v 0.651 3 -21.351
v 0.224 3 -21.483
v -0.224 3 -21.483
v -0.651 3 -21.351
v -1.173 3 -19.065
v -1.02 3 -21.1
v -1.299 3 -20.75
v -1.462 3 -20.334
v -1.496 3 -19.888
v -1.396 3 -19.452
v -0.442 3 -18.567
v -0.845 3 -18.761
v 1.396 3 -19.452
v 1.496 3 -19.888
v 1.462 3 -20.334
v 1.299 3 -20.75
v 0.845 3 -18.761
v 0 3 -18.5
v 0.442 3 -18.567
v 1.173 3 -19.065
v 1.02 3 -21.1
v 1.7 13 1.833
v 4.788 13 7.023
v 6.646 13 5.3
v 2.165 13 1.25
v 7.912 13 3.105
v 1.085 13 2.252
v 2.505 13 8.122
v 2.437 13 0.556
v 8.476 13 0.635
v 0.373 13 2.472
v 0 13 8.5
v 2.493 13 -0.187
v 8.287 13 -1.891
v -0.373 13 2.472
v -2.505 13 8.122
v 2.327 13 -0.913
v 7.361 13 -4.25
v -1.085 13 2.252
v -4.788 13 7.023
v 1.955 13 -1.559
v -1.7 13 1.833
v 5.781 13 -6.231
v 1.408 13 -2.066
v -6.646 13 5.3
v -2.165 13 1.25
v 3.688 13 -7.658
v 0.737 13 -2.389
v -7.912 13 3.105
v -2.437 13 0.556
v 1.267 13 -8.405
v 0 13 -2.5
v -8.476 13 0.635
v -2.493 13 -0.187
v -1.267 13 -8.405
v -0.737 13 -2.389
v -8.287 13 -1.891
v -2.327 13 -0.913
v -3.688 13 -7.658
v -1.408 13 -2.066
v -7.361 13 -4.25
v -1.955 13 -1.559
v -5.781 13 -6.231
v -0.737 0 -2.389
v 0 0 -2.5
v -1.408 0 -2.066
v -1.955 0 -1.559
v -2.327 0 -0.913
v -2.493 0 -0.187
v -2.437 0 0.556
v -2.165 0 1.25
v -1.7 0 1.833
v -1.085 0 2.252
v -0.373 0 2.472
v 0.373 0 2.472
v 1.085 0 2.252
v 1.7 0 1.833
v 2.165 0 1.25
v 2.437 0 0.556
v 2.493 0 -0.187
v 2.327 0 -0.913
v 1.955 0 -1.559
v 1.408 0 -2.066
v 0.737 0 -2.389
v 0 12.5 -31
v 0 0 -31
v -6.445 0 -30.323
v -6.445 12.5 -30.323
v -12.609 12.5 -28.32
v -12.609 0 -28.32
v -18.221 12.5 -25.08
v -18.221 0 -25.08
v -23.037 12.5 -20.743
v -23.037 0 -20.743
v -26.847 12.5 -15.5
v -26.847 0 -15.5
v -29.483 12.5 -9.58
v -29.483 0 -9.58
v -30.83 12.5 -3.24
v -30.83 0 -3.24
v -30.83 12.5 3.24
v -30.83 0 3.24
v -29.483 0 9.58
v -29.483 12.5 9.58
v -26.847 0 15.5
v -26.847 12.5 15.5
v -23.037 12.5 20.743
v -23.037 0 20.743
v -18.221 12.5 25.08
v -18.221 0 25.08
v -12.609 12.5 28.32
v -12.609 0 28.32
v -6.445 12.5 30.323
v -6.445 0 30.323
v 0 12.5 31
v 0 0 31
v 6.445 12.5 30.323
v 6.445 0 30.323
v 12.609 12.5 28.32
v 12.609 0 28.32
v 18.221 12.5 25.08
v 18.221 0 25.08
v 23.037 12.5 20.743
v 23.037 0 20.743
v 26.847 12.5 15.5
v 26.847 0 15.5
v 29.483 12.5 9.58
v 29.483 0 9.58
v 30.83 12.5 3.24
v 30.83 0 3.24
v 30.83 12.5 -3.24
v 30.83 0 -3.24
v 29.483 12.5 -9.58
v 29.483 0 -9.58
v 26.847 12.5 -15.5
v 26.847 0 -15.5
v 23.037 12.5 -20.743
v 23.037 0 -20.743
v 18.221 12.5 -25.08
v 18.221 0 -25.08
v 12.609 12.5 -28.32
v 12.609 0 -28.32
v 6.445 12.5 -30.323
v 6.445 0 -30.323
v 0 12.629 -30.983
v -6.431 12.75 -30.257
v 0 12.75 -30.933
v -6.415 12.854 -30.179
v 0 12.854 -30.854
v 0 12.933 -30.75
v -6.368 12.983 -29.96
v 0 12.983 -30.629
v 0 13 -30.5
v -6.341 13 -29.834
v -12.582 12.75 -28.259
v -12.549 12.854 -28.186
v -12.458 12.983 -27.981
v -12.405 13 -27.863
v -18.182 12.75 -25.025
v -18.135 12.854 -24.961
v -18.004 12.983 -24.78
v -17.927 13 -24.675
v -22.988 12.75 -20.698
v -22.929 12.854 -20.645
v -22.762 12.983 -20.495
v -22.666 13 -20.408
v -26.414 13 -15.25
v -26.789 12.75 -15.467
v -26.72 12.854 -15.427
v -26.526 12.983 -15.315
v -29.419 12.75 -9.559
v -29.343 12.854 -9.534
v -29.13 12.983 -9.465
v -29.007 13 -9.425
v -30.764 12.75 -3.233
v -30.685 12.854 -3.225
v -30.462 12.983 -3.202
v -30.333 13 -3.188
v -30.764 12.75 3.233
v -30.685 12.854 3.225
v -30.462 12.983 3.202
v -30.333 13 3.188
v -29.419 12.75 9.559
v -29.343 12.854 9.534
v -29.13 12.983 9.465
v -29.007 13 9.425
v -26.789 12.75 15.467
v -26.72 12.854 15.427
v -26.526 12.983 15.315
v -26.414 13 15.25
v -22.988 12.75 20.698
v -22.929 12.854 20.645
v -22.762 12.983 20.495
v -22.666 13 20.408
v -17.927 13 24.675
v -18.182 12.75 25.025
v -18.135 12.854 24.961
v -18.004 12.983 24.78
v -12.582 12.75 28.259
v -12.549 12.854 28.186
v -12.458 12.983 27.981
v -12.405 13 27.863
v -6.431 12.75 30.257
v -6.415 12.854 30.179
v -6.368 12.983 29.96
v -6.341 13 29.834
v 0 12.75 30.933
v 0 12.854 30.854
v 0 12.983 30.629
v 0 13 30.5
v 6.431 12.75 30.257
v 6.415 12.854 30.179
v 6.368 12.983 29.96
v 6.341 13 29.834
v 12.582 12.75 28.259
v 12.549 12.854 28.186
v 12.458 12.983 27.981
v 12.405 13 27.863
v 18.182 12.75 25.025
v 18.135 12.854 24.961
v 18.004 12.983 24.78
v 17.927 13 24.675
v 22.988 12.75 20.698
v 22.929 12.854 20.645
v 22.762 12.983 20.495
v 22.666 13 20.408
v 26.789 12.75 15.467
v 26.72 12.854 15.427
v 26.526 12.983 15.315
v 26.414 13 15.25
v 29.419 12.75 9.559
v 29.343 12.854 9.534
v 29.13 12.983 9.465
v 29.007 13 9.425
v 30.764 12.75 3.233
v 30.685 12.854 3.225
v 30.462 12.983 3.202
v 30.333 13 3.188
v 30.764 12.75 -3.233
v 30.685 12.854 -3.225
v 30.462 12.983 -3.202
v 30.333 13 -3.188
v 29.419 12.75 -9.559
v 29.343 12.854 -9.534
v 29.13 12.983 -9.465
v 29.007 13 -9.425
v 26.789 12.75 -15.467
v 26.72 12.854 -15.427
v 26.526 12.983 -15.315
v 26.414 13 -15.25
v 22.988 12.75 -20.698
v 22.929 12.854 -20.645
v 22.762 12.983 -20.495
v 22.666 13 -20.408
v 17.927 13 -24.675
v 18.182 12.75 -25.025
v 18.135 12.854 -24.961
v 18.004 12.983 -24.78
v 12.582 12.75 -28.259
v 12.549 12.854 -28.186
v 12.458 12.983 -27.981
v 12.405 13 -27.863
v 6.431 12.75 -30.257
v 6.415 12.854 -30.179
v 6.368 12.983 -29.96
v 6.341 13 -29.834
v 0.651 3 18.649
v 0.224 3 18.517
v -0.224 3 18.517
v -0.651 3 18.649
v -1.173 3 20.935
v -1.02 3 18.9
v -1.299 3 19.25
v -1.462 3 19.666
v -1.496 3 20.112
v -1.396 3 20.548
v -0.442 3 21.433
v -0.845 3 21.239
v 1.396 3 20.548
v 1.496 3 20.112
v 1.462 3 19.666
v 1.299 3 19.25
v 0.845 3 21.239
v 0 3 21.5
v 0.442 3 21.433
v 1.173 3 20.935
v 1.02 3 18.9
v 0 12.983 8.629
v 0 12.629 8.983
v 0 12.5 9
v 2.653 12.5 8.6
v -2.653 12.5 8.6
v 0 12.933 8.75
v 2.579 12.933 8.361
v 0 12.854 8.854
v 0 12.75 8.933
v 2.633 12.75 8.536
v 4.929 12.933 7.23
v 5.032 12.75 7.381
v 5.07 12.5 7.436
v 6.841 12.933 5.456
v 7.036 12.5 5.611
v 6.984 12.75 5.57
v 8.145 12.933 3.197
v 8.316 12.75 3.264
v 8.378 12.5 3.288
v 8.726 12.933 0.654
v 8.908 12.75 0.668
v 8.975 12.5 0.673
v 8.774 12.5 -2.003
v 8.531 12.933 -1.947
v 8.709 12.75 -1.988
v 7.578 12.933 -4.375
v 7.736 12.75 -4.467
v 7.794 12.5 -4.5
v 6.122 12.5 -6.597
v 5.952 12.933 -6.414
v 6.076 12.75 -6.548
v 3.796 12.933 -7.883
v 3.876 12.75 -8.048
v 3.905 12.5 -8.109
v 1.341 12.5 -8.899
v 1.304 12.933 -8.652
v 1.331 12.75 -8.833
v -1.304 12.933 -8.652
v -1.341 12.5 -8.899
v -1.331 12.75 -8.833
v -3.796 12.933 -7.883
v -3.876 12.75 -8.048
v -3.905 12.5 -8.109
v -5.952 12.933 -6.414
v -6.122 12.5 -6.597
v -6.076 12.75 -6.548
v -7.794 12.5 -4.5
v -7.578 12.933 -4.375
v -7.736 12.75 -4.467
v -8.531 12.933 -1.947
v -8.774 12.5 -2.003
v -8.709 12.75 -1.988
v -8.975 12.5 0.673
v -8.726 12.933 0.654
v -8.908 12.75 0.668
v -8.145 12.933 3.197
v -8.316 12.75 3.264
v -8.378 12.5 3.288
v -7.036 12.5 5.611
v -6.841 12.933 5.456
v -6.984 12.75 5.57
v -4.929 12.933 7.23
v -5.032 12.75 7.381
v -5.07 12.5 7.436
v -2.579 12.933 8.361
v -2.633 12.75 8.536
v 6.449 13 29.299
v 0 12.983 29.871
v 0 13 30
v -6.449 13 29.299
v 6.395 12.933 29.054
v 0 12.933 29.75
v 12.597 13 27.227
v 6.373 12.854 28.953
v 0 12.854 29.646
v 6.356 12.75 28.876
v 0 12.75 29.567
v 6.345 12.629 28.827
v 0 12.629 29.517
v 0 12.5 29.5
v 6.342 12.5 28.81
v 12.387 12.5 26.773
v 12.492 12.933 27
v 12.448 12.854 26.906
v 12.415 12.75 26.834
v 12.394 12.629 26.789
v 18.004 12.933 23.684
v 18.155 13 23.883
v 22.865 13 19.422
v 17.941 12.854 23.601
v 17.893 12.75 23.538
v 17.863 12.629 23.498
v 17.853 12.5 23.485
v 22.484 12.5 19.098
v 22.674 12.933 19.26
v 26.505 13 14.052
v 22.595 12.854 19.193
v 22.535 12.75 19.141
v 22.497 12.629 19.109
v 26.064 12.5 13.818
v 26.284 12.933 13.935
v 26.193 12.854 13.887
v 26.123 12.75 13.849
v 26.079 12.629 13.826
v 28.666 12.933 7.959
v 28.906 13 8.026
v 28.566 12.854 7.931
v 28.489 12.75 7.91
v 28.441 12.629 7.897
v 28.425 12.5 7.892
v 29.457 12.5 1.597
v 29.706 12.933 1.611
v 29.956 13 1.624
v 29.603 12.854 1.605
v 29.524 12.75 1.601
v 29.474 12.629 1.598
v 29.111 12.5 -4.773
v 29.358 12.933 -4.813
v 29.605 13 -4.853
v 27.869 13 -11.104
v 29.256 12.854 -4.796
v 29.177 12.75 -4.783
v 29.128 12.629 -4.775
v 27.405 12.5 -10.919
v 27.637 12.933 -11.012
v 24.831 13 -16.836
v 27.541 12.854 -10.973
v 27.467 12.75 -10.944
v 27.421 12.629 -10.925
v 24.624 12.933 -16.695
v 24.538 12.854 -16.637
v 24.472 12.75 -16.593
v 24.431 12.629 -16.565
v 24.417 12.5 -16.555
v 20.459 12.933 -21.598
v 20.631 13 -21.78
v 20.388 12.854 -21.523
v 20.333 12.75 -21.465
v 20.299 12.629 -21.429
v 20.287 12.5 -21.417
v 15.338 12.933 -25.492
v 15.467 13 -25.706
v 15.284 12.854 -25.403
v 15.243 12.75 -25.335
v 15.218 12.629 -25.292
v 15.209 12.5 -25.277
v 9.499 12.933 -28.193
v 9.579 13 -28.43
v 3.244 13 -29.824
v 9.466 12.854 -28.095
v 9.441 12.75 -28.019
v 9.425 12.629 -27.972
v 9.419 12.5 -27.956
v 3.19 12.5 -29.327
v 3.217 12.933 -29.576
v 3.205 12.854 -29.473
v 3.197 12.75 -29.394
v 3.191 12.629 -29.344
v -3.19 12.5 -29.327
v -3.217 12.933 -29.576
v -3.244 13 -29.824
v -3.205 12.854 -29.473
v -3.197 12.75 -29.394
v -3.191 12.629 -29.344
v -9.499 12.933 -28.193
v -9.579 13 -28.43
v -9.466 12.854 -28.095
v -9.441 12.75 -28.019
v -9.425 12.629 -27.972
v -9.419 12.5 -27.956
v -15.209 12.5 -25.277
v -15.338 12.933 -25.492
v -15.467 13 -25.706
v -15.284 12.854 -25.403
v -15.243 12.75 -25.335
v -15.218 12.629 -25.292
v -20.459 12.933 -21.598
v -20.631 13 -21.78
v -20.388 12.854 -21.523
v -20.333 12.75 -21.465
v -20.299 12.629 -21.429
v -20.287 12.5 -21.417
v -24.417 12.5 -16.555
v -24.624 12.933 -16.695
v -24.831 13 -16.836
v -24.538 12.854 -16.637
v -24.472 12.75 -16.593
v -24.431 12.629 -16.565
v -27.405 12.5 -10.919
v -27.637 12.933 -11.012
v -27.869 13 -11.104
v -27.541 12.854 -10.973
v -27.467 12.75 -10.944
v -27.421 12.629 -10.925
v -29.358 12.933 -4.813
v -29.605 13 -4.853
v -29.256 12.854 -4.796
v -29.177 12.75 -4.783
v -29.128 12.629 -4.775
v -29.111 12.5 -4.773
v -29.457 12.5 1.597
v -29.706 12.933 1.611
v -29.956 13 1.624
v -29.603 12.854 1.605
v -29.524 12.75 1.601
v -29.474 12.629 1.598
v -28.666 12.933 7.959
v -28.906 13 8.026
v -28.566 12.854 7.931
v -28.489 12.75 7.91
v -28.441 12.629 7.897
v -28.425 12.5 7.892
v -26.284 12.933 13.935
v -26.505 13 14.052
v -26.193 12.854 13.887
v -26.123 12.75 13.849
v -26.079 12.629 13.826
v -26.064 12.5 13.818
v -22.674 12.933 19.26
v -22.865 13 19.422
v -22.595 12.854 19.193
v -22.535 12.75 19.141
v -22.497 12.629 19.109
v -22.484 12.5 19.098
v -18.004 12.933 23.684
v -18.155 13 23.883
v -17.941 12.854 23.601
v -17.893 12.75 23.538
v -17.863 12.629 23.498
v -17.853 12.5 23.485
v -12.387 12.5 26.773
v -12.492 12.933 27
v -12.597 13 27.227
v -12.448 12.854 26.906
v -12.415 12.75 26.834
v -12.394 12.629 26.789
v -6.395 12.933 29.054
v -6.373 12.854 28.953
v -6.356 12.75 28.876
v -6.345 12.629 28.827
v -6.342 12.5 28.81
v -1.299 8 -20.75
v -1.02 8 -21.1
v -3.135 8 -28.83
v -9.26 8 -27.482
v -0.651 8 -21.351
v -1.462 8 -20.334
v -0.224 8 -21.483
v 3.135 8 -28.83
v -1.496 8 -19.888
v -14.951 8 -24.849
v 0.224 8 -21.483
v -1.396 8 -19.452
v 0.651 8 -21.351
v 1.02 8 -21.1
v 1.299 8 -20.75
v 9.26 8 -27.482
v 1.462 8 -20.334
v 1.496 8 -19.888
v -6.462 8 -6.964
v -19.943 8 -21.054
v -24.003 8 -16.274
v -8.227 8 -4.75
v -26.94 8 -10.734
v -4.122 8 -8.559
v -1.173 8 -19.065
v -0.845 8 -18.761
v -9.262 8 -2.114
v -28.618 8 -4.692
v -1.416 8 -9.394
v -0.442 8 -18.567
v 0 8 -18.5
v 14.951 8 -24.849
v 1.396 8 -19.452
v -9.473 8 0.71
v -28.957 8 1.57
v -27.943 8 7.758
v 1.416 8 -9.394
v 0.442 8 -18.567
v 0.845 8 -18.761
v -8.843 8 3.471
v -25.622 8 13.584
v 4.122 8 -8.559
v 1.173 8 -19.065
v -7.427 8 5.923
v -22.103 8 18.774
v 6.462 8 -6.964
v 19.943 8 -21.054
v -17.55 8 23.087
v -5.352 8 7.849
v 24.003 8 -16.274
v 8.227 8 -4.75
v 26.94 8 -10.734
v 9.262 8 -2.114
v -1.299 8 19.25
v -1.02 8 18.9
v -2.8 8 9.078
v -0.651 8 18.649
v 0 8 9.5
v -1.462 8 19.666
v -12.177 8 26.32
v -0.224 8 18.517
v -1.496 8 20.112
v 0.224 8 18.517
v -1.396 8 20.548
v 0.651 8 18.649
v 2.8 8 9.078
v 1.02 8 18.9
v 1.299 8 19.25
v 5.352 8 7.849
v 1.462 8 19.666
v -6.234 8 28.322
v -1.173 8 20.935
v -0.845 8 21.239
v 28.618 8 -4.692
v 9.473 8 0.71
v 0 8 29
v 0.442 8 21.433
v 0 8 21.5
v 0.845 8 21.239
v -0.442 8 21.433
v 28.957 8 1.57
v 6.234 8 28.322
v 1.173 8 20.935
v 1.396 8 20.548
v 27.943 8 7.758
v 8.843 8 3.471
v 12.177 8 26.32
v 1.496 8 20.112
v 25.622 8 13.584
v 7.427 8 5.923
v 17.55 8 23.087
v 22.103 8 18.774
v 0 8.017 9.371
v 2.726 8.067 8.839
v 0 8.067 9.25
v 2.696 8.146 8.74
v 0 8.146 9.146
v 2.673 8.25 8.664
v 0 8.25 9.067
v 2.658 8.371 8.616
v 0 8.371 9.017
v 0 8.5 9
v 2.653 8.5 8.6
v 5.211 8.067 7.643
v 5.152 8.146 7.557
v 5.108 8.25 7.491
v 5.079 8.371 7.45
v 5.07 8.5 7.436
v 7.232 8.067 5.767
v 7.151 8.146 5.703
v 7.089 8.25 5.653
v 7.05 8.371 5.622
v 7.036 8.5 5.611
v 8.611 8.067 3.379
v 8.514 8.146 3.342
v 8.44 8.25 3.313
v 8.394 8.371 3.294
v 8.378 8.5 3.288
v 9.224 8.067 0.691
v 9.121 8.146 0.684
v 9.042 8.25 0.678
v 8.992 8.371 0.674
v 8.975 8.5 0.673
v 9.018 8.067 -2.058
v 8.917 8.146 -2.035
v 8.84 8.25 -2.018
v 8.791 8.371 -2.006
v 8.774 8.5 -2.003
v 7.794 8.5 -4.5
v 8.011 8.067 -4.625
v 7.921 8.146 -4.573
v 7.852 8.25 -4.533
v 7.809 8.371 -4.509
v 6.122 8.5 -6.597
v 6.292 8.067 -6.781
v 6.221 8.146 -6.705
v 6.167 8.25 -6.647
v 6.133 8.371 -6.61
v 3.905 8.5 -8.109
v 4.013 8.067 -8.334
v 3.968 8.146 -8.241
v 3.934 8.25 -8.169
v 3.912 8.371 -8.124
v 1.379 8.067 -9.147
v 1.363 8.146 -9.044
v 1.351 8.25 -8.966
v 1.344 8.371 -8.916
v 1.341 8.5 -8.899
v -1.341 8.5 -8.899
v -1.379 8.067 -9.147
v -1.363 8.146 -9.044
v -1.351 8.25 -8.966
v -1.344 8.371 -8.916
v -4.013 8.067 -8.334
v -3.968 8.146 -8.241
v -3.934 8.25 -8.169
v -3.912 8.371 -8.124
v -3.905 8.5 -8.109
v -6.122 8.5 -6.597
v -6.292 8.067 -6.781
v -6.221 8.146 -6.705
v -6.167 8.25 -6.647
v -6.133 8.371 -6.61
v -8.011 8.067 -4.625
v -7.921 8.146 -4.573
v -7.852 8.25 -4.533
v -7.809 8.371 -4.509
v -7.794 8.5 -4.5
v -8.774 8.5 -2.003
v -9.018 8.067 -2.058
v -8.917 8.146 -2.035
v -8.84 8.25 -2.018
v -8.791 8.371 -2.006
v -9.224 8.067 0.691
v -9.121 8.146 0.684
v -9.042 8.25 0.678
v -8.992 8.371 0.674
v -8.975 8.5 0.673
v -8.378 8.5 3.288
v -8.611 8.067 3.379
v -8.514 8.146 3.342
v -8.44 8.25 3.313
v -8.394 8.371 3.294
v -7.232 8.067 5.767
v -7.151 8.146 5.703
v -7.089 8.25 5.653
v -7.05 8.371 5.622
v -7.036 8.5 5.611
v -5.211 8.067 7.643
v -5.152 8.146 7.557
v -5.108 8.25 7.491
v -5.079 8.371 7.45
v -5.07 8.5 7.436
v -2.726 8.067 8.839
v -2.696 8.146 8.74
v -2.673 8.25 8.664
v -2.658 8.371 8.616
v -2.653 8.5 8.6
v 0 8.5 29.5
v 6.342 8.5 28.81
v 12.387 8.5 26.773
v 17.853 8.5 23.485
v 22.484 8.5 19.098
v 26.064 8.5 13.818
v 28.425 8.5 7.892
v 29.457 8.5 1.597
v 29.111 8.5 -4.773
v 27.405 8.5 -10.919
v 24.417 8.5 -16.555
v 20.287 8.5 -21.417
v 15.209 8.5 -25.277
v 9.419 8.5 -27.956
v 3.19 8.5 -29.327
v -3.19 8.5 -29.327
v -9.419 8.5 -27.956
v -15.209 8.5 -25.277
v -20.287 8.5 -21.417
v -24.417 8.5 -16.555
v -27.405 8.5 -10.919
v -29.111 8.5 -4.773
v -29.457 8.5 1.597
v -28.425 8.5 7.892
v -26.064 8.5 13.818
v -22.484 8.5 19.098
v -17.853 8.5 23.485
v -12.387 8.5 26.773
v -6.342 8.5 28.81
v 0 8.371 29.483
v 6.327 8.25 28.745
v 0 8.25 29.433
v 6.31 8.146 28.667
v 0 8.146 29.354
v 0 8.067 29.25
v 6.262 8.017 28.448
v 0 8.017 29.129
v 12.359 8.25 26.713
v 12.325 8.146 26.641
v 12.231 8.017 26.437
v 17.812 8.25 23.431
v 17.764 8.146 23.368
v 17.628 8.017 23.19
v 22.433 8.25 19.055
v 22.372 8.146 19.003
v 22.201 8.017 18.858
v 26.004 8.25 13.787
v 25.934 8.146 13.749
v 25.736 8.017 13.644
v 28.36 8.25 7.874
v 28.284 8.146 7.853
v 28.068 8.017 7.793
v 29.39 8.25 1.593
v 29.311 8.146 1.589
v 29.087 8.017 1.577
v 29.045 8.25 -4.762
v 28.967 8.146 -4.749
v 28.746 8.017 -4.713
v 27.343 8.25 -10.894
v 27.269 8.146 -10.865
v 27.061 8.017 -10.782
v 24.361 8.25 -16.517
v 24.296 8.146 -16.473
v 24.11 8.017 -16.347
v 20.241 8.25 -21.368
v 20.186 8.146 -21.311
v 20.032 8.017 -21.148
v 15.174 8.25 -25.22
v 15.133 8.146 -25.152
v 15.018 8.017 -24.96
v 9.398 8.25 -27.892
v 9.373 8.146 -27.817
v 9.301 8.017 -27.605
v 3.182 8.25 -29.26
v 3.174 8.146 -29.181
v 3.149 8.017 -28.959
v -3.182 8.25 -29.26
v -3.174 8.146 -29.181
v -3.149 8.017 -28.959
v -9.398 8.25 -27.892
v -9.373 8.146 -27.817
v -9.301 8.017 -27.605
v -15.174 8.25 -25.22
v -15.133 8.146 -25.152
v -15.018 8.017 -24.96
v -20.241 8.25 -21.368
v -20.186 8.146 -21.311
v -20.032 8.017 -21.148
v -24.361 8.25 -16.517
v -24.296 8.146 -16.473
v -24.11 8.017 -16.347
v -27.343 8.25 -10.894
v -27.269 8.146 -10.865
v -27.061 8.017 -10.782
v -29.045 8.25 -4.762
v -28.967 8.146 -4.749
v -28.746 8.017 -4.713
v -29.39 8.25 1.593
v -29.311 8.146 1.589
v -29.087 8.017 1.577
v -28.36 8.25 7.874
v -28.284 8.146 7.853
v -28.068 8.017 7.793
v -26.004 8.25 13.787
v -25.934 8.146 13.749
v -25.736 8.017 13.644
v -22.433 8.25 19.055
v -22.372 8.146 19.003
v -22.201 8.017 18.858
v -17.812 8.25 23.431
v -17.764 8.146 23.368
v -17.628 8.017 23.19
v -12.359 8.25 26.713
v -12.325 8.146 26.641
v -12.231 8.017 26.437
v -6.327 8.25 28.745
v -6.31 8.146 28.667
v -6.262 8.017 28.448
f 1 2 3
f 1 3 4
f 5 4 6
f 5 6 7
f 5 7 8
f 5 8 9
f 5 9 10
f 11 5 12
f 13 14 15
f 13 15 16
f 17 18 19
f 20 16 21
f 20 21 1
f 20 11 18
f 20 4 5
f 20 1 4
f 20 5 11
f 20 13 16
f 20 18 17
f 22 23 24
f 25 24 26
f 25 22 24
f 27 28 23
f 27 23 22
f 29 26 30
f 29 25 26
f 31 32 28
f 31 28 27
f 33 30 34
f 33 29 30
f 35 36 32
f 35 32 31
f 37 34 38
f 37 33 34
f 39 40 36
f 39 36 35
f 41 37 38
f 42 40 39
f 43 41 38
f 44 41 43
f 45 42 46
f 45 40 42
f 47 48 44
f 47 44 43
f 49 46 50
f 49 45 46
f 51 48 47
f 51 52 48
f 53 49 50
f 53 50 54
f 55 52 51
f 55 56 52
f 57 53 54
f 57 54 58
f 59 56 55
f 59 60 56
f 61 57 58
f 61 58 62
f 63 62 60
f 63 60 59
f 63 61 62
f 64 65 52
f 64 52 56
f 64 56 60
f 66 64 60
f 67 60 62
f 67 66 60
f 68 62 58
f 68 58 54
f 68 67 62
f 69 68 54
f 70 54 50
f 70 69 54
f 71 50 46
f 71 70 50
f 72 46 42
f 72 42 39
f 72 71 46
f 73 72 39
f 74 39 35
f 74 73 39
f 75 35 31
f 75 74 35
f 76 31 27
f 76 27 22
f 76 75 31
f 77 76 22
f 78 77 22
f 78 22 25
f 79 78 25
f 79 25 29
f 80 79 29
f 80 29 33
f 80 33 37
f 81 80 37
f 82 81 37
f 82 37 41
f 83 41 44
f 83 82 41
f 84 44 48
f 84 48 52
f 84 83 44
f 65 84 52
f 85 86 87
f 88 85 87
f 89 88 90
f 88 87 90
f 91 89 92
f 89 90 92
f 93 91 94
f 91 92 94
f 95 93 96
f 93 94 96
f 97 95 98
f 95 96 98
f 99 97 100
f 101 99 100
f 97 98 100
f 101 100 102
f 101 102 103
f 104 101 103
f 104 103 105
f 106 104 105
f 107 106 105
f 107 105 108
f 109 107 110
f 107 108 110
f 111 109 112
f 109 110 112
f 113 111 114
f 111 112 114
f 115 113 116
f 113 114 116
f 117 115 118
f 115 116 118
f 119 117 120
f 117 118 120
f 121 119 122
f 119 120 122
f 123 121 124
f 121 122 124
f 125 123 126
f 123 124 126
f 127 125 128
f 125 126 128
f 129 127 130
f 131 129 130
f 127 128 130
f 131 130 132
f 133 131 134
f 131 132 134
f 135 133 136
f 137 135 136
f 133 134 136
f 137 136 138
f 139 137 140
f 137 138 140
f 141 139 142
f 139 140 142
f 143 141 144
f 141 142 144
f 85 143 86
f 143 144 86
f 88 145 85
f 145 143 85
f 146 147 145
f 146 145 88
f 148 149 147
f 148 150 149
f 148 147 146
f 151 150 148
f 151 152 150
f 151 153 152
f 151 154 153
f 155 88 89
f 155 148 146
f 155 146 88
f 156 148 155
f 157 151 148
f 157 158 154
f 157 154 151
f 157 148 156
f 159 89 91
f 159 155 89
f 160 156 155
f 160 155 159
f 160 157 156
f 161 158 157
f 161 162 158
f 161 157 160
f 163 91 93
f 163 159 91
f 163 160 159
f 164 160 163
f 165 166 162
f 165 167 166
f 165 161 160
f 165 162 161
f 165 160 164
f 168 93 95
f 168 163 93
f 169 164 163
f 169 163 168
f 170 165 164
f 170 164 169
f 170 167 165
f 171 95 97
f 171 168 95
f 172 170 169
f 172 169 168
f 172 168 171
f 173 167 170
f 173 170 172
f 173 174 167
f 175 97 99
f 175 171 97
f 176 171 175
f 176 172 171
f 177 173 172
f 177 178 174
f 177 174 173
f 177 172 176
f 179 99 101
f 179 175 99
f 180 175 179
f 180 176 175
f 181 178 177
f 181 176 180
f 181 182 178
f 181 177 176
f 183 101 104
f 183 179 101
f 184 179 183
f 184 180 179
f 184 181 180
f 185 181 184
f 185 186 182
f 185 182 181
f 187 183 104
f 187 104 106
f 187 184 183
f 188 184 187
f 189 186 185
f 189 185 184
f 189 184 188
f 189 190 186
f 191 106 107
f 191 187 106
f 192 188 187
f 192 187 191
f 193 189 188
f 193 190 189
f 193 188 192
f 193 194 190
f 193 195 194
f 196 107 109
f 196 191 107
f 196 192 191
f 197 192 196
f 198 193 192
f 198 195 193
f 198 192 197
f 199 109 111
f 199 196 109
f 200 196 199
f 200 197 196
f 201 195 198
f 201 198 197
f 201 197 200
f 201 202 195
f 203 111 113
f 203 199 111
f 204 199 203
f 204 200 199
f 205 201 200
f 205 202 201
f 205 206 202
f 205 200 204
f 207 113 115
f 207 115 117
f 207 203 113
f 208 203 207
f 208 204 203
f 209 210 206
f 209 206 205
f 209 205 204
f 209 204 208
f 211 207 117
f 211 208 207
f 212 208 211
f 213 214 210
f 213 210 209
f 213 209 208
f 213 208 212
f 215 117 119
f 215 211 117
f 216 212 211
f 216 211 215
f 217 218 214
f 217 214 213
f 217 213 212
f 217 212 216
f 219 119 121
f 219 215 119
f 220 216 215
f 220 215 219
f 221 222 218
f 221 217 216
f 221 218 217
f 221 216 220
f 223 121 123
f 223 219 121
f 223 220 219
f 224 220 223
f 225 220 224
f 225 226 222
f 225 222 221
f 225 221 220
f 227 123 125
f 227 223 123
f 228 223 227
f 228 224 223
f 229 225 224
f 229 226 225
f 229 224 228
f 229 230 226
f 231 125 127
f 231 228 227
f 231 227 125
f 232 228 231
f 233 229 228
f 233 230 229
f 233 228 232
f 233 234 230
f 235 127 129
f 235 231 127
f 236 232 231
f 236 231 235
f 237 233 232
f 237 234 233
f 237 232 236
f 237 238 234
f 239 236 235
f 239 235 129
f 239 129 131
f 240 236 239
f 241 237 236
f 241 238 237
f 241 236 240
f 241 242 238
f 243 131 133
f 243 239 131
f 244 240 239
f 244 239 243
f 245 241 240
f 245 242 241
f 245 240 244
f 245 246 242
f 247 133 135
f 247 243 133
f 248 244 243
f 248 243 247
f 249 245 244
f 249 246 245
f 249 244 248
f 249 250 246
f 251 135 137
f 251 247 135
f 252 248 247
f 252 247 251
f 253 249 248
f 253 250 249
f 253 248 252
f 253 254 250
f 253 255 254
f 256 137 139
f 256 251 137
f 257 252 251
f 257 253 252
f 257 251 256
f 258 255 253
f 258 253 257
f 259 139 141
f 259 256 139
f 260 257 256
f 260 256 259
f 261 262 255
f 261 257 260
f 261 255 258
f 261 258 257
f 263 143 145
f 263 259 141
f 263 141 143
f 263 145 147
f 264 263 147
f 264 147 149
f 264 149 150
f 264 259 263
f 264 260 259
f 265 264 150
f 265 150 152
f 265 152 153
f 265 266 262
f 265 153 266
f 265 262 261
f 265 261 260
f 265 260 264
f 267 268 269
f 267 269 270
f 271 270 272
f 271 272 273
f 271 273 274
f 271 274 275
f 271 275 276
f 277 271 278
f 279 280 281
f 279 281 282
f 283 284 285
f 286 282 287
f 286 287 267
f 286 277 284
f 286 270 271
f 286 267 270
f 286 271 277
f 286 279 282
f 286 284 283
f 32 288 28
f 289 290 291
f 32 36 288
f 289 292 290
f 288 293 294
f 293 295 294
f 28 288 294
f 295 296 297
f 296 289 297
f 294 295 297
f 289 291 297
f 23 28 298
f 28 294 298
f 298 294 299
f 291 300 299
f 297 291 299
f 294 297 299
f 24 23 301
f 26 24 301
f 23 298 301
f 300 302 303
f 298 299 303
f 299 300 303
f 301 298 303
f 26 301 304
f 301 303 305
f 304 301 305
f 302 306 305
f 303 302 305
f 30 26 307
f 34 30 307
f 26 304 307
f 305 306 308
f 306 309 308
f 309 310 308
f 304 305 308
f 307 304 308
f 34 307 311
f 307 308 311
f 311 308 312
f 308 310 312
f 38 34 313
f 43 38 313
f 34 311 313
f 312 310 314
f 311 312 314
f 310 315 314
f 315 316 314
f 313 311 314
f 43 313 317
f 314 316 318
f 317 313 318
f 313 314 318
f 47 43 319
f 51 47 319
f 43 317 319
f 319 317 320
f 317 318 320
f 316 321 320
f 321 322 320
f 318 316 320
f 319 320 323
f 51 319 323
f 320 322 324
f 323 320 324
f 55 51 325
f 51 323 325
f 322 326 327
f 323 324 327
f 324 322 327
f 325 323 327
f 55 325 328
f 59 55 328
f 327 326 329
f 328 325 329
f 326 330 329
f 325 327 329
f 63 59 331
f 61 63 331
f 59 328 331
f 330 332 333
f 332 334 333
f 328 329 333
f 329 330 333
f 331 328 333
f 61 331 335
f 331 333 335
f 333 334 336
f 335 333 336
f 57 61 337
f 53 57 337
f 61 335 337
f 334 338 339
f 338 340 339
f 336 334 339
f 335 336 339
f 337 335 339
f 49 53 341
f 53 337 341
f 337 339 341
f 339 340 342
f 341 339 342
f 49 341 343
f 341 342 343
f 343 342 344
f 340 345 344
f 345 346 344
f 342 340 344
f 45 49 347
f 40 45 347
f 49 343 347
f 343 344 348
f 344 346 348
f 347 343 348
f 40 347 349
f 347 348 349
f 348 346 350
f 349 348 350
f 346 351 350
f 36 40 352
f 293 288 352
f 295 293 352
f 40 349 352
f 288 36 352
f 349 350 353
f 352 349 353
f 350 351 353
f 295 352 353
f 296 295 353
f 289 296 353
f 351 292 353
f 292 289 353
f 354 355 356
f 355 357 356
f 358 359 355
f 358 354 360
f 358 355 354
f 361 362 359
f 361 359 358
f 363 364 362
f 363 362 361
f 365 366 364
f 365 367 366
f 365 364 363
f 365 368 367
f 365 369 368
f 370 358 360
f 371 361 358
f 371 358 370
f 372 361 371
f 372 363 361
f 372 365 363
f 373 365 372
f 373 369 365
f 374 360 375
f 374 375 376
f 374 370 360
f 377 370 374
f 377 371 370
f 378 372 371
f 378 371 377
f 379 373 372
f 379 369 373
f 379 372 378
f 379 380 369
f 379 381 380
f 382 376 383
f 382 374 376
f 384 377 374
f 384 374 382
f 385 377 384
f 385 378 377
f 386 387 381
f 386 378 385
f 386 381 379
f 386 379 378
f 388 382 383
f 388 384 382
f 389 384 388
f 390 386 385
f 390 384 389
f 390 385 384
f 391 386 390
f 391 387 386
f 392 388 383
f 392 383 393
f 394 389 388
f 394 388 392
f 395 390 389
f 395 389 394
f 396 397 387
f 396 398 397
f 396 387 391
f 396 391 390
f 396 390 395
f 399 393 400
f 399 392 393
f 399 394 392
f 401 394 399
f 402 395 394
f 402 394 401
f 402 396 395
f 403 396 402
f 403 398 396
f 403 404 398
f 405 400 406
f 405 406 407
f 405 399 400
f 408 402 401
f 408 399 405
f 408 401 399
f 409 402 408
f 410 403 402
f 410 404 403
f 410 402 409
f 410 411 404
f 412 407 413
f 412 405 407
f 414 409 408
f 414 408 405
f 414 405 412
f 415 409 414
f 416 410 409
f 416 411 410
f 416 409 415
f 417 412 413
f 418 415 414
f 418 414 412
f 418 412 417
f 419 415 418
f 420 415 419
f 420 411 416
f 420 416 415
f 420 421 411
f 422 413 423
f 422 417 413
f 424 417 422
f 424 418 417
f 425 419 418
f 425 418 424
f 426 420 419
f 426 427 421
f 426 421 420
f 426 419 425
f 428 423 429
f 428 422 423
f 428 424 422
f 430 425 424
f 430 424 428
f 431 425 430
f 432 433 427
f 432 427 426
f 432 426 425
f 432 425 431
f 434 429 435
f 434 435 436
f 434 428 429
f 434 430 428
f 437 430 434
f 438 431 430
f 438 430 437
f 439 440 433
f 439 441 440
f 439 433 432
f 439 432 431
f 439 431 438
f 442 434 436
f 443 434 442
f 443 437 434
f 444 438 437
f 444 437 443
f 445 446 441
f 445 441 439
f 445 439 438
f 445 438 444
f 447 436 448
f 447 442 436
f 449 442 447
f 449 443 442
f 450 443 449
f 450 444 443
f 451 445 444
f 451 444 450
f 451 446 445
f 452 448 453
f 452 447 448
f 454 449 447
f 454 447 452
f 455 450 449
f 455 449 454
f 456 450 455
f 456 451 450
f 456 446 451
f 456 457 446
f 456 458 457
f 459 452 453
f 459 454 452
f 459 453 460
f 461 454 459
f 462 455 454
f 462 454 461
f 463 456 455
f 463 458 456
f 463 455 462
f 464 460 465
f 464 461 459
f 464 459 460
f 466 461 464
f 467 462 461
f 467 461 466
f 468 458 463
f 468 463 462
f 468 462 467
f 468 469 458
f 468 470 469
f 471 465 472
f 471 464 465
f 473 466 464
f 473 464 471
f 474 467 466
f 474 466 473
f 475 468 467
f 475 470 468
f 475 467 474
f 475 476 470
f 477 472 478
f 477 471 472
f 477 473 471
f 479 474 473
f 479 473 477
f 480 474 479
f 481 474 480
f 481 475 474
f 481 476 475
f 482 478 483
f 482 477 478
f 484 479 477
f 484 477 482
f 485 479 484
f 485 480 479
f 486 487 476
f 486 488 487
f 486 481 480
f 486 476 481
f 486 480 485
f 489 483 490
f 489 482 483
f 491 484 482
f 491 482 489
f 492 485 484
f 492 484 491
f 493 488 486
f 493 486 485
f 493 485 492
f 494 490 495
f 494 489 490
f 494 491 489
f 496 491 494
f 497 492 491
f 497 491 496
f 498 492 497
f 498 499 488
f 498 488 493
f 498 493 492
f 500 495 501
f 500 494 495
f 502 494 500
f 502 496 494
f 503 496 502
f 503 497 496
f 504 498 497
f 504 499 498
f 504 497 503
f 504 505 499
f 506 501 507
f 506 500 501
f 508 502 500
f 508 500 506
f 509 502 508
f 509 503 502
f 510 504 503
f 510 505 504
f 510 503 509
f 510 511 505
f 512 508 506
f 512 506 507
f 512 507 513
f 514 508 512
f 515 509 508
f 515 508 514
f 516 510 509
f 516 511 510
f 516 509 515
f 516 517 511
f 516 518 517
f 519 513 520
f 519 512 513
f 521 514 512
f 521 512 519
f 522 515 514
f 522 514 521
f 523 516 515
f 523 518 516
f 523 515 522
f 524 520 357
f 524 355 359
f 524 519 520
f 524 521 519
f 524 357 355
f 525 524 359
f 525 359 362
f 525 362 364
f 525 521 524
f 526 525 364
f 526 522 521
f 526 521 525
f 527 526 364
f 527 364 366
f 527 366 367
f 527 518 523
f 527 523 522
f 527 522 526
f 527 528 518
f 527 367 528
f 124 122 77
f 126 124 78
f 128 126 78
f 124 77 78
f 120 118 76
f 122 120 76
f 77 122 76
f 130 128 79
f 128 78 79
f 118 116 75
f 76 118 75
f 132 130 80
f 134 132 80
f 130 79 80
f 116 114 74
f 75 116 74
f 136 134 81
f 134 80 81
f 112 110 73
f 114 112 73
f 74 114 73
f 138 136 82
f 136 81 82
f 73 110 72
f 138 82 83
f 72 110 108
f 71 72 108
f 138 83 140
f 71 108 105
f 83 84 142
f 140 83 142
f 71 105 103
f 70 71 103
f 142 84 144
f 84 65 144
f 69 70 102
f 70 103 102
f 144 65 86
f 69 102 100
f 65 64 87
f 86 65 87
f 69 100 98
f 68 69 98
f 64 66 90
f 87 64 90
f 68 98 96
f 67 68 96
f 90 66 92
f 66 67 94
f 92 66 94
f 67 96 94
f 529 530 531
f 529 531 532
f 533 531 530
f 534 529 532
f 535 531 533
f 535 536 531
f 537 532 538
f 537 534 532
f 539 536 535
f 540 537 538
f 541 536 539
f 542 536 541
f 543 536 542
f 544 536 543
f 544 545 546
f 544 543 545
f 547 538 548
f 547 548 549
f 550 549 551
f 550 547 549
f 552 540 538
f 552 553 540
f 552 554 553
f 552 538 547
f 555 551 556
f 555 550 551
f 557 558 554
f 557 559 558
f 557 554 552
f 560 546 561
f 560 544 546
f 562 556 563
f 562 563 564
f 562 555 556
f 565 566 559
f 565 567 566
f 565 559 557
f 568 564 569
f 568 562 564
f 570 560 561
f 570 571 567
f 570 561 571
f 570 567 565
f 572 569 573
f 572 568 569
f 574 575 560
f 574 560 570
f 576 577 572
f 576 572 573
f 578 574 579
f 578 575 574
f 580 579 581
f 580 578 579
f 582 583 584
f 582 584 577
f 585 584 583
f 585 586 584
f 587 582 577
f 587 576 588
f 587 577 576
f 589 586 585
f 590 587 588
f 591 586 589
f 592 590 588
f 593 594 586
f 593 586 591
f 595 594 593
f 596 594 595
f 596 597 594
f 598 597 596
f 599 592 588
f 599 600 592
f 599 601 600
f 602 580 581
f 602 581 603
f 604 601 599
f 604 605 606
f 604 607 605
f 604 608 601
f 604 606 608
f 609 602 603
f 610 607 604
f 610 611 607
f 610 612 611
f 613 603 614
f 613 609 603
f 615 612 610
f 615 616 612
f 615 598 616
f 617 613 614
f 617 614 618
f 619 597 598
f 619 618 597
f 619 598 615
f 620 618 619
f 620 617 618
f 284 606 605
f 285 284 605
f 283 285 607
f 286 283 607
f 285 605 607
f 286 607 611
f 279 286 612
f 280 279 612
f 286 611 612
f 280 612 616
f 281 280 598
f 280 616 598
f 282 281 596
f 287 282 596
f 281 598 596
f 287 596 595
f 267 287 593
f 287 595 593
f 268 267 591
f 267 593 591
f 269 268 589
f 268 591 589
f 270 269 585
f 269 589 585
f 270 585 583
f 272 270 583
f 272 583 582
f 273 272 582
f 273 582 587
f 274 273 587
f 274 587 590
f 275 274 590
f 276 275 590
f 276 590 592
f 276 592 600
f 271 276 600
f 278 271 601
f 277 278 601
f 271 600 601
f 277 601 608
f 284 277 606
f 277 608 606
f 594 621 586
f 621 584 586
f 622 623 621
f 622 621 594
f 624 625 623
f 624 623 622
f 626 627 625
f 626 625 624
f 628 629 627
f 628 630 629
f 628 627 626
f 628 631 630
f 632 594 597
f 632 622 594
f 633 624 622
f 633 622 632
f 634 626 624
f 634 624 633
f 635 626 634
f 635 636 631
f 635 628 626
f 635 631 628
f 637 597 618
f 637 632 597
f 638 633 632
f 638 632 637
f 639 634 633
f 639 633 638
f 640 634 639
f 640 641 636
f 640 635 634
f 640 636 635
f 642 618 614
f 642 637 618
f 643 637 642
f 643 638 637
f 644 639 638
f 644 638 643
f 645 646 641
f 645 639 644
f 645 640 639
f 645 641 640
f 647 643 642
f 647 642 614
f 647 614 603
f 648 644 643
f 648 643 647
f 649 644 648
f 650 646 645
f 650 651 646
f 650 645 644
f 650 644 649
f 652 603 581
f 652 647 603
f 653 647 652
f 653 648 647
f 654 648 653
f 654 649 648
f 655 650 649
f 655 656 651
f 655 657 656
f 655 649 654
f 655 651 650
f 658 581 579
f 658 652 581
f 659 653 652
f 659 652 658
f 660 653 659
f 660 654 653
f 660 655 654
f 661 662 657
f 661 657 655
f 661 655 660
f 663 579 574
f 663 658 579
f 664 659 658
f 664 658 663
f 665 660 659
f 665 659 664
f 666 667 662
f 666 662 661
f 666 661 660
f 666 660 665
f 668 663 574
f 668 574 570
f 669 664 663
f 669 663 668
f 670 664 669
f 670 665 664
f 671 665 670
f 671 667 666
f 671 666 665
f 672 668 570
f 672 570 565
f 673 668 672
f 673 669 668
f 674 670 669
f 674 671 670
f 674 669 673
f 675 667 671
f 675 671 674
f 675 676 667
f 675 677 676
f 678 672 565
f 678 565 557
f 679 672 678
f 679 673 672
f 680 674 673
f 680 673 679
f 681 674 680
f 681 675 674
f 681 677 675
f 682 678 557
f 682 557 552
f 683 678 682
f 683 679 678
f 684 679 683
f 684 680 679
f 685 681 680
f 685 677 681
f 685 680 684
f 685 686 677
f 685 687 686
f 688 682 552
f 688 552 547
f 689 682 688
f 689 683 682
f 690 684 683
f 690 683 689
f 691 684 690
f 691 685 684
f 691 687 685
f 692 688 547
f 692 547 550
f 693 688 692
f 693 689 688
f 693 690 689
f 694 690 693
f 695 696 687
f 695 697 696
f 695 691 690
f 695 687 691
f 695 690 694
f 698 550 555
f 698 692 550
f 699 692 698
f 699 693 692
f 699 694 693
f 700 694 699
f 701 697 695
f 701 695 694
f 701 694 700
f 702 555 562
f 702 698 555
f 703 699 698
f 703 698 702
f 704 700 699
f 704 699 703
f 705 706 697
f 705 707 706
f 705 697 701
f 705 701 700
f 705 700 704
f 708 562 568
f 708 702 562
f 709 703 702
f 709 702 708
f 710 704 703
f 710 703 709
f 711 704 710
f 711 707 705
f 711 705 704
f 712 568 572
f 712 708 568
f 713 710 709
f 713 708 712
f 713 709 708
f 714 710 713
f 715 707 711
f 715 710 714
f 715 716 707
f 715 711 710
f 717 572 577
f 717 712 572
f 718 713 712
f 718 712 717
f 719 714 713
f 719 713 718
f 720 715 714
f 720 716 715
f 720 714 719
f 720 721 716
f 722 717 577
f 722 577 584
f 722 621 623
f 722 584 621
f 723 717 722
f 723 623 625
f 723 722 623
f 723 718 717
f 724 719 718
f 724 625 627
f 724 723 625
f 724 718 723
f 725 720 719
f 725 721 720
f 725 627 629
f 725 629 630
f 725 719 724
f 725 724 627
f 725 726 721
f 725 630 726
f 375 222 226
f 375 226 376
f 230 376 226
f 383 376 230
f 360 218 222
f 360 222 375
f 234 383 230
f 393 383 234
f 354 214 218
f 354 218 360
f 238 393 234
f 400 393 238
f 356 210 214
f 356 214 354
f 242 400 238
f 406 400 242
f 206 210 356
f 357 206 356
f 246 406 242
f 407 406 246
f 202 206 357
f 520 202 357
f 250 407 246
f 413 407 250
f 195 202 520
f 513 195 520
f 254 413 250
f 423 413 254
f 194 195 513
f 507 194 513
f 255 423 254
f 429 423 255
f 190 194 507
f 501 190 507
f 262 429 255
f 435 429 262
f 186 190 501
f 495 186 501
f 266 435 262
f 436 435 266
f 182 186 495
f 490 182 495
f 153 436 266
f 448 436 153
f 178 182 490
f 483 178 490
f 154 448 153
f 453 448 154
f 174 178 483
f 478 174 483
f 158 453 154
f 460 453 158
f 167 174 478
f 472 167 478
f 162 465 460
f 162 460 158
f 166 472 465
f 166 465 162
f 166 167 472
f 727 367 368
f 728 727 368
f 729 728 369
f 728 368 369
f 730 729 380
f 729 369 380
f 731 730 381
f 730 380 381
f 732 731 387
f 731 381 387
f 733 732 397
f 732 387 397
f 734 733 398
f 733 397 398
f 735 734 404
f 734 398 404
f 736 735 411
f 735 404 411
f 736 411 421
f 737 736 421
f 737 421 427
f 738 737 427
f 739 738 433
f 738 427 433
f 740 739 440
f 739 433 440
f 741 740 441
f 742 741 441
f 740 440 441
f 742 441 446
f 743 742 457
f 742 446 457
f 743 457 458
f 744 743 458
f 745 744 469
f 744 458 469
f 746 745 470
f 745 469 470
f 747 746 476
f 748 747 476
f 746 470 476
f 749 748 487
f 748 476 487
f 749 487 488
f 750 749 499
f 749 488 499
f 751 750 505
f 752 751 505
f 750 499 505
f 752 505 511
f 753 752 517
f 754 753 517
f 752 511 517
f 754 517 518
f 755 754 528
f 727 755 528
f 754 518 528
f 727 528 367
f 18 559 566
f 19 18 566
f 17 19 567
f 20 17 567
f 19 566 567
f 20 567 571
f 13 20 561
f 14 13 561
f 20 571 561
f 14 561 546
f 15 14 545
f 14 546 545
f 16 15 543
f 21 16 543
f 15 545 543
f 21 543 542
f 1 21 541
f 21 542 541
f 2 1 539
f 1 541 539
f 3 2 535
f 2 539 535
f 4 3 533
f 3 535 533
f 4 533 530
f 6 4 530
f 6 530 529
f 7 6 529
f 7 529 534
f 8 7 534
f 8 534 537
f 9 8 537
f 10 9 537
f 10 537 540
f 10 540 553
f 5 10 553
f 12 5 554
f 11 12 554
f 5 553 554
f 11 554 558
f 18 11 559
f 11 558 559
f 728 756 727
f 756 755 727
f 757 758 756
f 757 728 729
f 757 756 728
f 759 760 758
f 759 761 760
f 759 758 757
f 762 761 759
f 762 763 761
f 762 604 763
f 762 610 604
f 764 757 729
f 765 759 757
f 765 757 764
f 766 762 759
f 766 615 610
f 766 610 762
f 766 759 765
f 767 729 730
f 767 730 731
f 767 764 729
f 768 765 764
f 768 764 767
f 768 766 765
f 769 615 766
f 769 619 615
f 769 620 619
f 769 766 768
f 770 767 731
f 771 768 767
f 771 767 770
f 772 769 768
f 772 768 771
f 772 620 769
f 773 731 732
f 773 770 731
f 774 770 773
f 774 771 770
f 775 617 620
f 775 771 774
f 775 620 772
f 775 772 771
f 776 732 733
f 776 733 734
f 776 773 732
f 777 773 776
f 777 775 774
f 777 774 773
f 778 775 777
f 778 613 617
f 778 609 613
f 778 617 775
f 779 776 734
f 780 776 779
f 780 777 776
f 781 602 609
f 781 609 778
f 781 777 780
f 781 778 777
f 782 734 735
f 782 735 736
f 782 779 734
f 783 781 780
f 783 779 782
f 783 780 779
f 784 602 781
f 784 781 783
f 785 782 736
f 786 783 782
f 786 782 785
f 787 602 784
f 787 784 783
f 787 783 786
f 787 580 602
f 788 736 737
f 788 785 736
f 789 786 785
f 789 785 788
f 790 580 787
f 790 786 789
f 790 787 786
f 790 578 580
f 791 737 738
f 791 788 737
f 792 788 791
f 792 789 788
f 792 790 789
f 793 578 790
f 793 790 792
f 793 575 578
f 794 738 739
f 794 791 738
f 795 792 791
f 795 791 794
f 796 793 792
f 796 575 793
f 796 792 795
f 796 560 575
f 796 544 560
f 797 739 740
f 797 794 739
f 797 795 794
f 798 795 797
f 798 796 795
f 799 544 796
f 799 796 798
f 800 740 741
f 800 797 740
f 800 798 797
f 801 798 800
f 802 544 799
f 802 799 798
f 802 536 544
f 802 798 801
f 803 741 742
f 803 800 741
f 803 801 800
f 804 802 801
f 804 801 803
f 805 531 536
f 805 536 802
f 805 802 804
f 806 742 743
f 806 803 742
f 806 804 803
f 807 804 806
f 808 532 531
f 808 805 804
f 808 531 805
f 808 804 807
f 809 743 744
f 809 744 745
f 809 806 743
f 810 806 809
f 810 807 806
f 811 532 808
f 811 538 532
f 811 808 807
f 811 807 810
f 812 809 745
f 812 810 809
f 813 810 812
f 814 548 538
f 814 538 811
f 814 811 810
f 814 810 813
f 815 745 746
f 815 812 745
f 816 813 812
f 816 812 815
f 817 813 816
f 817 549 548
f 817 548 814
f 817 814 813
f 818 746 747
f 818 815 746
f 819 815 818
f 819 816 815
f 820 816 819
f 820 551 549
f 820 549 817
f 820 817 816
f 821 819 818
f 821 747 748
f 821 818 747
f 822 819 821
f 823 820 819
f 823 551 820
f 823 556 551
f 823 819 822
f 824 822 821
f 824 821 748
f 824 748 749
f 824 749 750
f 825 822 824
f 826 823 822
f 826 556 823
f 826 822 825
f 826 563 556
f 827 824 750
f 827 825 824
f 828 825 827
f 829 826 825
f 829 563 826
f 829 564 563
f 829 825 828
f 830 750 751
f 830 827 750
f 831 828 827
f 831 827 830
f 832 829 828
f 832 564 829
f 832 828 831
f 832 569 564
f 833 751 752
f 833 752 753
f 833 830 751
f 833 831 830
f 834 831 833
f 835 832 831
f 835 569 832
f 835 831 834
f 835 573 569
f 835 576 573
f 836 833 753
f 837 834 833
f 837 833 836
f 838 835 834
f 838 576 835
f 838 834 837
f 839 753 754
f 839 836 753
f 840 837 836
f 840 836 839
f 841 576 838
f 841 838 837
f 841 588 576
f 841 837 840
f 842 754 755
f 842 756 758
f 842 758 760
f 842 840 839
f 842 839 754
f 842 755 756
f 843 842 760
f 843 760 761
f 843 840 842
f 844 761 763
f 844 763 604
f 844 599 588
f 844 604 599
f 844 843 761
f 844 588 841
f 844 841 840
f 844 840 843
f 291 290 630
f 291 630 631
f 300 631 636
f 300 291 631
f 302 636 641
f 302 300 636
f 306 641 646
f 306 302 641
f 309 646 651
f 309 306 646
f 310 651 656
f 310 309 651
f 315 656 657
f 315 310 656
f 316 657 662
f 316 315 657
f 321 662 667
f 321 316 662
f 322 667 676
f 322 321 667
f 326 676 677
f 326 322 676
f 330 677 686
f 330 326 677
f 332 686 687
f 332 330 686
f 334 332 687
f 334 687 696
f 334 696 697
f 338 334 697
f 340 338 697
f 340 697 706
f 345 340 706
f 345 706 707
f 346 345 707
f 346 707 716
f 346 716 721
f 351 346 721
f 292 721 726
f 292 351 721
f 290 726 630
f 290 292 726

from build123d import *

# Parameters (mm, degrees)
ESQUISSE1_R             = 31
ESQUISSE1_R_2           = 2.5
EXTRUSION1_DEPTH        = 13
ESQUISSE2_R             = 29.5
ESQUISSE2_R_2           = 9
ENL_V_MAT_EXTRU_1_DEPTH = 5
CONG_1_R                = 0.5
ESQUISSE3_R             = 1.5
ENL_V_MAT_EXTRU_2_DEPTH = 5


with BuildPart() as part:
    # Esquisse1 → Extrusion1 (new body)
    with BuildSketch(Plane(origin=(0, 0, 0), x_dir=(1, 0, 0), z_dir=(0, 1, 0))):
        with Locations(Location((0, 0, 0), (0, 0, 90))):
            Circle(ESQUISSE1_R)
        with Locations(Location((0, 0, 0), (0, 0, 90))):
            Circle(ESQUISSE1_R_2, mode=Mode.SUBTRACT)
    extrude(amount=EXTRUSION1_DEPTH)

    # Esquisse2 → Enlèv. mat.-Extru.1 (cut)
    with BuildSketch(Plane(origin=(0, 13, 0), x_dir=(1, 0, 0), z_dir=(0, 1, 0))):
        with Locations(Location((0, 0, 0), (0, 0, 270))):
            Circle(ESQUISSE2_R)
        with Locations(Location((0, 0, 0), (0, 0, 270))):
            Circle(ESQUISSE2_R_2, mode=Mode.SUBTRACT)
    extrude(amount=-ENL_V_MAT_EXTRU_1_DEPTH, mode=Mode.SUBTRACT)

    # Congé1
    cong_1_edges = [part.edges().sort_by_distance(p)[0] for p in [
        (0, 8, -29.5),
        (0, 8, -9),
        (0, 13, -29.5),
        (0, 13, -9),
        (0, 13, 31),
    ]]
    fillet(cong_1_edges, radius=CONG_1_R)

    # Esquisse3 → Enlèv. mat.-Extru.2 (cut)
    with BuildSketch(Plane(origin=(0, 8, 0), x_dir=(1, 0, 0), z_dir=(0, 1, 0))):
        with Locations(Location((0, 20, 0), (0, 0, 270))):
            Circle(ESQUISSE3_R)
        with Locations(Location((0, -20, 0), (0, 0, 270))):
            Circle(ESQUISSE3_R)
    extrude(amount=-ENL_V_MAT_EXTRU_2_DEPTH, mode=Mode.SUBTRACT)


solid = part.part
